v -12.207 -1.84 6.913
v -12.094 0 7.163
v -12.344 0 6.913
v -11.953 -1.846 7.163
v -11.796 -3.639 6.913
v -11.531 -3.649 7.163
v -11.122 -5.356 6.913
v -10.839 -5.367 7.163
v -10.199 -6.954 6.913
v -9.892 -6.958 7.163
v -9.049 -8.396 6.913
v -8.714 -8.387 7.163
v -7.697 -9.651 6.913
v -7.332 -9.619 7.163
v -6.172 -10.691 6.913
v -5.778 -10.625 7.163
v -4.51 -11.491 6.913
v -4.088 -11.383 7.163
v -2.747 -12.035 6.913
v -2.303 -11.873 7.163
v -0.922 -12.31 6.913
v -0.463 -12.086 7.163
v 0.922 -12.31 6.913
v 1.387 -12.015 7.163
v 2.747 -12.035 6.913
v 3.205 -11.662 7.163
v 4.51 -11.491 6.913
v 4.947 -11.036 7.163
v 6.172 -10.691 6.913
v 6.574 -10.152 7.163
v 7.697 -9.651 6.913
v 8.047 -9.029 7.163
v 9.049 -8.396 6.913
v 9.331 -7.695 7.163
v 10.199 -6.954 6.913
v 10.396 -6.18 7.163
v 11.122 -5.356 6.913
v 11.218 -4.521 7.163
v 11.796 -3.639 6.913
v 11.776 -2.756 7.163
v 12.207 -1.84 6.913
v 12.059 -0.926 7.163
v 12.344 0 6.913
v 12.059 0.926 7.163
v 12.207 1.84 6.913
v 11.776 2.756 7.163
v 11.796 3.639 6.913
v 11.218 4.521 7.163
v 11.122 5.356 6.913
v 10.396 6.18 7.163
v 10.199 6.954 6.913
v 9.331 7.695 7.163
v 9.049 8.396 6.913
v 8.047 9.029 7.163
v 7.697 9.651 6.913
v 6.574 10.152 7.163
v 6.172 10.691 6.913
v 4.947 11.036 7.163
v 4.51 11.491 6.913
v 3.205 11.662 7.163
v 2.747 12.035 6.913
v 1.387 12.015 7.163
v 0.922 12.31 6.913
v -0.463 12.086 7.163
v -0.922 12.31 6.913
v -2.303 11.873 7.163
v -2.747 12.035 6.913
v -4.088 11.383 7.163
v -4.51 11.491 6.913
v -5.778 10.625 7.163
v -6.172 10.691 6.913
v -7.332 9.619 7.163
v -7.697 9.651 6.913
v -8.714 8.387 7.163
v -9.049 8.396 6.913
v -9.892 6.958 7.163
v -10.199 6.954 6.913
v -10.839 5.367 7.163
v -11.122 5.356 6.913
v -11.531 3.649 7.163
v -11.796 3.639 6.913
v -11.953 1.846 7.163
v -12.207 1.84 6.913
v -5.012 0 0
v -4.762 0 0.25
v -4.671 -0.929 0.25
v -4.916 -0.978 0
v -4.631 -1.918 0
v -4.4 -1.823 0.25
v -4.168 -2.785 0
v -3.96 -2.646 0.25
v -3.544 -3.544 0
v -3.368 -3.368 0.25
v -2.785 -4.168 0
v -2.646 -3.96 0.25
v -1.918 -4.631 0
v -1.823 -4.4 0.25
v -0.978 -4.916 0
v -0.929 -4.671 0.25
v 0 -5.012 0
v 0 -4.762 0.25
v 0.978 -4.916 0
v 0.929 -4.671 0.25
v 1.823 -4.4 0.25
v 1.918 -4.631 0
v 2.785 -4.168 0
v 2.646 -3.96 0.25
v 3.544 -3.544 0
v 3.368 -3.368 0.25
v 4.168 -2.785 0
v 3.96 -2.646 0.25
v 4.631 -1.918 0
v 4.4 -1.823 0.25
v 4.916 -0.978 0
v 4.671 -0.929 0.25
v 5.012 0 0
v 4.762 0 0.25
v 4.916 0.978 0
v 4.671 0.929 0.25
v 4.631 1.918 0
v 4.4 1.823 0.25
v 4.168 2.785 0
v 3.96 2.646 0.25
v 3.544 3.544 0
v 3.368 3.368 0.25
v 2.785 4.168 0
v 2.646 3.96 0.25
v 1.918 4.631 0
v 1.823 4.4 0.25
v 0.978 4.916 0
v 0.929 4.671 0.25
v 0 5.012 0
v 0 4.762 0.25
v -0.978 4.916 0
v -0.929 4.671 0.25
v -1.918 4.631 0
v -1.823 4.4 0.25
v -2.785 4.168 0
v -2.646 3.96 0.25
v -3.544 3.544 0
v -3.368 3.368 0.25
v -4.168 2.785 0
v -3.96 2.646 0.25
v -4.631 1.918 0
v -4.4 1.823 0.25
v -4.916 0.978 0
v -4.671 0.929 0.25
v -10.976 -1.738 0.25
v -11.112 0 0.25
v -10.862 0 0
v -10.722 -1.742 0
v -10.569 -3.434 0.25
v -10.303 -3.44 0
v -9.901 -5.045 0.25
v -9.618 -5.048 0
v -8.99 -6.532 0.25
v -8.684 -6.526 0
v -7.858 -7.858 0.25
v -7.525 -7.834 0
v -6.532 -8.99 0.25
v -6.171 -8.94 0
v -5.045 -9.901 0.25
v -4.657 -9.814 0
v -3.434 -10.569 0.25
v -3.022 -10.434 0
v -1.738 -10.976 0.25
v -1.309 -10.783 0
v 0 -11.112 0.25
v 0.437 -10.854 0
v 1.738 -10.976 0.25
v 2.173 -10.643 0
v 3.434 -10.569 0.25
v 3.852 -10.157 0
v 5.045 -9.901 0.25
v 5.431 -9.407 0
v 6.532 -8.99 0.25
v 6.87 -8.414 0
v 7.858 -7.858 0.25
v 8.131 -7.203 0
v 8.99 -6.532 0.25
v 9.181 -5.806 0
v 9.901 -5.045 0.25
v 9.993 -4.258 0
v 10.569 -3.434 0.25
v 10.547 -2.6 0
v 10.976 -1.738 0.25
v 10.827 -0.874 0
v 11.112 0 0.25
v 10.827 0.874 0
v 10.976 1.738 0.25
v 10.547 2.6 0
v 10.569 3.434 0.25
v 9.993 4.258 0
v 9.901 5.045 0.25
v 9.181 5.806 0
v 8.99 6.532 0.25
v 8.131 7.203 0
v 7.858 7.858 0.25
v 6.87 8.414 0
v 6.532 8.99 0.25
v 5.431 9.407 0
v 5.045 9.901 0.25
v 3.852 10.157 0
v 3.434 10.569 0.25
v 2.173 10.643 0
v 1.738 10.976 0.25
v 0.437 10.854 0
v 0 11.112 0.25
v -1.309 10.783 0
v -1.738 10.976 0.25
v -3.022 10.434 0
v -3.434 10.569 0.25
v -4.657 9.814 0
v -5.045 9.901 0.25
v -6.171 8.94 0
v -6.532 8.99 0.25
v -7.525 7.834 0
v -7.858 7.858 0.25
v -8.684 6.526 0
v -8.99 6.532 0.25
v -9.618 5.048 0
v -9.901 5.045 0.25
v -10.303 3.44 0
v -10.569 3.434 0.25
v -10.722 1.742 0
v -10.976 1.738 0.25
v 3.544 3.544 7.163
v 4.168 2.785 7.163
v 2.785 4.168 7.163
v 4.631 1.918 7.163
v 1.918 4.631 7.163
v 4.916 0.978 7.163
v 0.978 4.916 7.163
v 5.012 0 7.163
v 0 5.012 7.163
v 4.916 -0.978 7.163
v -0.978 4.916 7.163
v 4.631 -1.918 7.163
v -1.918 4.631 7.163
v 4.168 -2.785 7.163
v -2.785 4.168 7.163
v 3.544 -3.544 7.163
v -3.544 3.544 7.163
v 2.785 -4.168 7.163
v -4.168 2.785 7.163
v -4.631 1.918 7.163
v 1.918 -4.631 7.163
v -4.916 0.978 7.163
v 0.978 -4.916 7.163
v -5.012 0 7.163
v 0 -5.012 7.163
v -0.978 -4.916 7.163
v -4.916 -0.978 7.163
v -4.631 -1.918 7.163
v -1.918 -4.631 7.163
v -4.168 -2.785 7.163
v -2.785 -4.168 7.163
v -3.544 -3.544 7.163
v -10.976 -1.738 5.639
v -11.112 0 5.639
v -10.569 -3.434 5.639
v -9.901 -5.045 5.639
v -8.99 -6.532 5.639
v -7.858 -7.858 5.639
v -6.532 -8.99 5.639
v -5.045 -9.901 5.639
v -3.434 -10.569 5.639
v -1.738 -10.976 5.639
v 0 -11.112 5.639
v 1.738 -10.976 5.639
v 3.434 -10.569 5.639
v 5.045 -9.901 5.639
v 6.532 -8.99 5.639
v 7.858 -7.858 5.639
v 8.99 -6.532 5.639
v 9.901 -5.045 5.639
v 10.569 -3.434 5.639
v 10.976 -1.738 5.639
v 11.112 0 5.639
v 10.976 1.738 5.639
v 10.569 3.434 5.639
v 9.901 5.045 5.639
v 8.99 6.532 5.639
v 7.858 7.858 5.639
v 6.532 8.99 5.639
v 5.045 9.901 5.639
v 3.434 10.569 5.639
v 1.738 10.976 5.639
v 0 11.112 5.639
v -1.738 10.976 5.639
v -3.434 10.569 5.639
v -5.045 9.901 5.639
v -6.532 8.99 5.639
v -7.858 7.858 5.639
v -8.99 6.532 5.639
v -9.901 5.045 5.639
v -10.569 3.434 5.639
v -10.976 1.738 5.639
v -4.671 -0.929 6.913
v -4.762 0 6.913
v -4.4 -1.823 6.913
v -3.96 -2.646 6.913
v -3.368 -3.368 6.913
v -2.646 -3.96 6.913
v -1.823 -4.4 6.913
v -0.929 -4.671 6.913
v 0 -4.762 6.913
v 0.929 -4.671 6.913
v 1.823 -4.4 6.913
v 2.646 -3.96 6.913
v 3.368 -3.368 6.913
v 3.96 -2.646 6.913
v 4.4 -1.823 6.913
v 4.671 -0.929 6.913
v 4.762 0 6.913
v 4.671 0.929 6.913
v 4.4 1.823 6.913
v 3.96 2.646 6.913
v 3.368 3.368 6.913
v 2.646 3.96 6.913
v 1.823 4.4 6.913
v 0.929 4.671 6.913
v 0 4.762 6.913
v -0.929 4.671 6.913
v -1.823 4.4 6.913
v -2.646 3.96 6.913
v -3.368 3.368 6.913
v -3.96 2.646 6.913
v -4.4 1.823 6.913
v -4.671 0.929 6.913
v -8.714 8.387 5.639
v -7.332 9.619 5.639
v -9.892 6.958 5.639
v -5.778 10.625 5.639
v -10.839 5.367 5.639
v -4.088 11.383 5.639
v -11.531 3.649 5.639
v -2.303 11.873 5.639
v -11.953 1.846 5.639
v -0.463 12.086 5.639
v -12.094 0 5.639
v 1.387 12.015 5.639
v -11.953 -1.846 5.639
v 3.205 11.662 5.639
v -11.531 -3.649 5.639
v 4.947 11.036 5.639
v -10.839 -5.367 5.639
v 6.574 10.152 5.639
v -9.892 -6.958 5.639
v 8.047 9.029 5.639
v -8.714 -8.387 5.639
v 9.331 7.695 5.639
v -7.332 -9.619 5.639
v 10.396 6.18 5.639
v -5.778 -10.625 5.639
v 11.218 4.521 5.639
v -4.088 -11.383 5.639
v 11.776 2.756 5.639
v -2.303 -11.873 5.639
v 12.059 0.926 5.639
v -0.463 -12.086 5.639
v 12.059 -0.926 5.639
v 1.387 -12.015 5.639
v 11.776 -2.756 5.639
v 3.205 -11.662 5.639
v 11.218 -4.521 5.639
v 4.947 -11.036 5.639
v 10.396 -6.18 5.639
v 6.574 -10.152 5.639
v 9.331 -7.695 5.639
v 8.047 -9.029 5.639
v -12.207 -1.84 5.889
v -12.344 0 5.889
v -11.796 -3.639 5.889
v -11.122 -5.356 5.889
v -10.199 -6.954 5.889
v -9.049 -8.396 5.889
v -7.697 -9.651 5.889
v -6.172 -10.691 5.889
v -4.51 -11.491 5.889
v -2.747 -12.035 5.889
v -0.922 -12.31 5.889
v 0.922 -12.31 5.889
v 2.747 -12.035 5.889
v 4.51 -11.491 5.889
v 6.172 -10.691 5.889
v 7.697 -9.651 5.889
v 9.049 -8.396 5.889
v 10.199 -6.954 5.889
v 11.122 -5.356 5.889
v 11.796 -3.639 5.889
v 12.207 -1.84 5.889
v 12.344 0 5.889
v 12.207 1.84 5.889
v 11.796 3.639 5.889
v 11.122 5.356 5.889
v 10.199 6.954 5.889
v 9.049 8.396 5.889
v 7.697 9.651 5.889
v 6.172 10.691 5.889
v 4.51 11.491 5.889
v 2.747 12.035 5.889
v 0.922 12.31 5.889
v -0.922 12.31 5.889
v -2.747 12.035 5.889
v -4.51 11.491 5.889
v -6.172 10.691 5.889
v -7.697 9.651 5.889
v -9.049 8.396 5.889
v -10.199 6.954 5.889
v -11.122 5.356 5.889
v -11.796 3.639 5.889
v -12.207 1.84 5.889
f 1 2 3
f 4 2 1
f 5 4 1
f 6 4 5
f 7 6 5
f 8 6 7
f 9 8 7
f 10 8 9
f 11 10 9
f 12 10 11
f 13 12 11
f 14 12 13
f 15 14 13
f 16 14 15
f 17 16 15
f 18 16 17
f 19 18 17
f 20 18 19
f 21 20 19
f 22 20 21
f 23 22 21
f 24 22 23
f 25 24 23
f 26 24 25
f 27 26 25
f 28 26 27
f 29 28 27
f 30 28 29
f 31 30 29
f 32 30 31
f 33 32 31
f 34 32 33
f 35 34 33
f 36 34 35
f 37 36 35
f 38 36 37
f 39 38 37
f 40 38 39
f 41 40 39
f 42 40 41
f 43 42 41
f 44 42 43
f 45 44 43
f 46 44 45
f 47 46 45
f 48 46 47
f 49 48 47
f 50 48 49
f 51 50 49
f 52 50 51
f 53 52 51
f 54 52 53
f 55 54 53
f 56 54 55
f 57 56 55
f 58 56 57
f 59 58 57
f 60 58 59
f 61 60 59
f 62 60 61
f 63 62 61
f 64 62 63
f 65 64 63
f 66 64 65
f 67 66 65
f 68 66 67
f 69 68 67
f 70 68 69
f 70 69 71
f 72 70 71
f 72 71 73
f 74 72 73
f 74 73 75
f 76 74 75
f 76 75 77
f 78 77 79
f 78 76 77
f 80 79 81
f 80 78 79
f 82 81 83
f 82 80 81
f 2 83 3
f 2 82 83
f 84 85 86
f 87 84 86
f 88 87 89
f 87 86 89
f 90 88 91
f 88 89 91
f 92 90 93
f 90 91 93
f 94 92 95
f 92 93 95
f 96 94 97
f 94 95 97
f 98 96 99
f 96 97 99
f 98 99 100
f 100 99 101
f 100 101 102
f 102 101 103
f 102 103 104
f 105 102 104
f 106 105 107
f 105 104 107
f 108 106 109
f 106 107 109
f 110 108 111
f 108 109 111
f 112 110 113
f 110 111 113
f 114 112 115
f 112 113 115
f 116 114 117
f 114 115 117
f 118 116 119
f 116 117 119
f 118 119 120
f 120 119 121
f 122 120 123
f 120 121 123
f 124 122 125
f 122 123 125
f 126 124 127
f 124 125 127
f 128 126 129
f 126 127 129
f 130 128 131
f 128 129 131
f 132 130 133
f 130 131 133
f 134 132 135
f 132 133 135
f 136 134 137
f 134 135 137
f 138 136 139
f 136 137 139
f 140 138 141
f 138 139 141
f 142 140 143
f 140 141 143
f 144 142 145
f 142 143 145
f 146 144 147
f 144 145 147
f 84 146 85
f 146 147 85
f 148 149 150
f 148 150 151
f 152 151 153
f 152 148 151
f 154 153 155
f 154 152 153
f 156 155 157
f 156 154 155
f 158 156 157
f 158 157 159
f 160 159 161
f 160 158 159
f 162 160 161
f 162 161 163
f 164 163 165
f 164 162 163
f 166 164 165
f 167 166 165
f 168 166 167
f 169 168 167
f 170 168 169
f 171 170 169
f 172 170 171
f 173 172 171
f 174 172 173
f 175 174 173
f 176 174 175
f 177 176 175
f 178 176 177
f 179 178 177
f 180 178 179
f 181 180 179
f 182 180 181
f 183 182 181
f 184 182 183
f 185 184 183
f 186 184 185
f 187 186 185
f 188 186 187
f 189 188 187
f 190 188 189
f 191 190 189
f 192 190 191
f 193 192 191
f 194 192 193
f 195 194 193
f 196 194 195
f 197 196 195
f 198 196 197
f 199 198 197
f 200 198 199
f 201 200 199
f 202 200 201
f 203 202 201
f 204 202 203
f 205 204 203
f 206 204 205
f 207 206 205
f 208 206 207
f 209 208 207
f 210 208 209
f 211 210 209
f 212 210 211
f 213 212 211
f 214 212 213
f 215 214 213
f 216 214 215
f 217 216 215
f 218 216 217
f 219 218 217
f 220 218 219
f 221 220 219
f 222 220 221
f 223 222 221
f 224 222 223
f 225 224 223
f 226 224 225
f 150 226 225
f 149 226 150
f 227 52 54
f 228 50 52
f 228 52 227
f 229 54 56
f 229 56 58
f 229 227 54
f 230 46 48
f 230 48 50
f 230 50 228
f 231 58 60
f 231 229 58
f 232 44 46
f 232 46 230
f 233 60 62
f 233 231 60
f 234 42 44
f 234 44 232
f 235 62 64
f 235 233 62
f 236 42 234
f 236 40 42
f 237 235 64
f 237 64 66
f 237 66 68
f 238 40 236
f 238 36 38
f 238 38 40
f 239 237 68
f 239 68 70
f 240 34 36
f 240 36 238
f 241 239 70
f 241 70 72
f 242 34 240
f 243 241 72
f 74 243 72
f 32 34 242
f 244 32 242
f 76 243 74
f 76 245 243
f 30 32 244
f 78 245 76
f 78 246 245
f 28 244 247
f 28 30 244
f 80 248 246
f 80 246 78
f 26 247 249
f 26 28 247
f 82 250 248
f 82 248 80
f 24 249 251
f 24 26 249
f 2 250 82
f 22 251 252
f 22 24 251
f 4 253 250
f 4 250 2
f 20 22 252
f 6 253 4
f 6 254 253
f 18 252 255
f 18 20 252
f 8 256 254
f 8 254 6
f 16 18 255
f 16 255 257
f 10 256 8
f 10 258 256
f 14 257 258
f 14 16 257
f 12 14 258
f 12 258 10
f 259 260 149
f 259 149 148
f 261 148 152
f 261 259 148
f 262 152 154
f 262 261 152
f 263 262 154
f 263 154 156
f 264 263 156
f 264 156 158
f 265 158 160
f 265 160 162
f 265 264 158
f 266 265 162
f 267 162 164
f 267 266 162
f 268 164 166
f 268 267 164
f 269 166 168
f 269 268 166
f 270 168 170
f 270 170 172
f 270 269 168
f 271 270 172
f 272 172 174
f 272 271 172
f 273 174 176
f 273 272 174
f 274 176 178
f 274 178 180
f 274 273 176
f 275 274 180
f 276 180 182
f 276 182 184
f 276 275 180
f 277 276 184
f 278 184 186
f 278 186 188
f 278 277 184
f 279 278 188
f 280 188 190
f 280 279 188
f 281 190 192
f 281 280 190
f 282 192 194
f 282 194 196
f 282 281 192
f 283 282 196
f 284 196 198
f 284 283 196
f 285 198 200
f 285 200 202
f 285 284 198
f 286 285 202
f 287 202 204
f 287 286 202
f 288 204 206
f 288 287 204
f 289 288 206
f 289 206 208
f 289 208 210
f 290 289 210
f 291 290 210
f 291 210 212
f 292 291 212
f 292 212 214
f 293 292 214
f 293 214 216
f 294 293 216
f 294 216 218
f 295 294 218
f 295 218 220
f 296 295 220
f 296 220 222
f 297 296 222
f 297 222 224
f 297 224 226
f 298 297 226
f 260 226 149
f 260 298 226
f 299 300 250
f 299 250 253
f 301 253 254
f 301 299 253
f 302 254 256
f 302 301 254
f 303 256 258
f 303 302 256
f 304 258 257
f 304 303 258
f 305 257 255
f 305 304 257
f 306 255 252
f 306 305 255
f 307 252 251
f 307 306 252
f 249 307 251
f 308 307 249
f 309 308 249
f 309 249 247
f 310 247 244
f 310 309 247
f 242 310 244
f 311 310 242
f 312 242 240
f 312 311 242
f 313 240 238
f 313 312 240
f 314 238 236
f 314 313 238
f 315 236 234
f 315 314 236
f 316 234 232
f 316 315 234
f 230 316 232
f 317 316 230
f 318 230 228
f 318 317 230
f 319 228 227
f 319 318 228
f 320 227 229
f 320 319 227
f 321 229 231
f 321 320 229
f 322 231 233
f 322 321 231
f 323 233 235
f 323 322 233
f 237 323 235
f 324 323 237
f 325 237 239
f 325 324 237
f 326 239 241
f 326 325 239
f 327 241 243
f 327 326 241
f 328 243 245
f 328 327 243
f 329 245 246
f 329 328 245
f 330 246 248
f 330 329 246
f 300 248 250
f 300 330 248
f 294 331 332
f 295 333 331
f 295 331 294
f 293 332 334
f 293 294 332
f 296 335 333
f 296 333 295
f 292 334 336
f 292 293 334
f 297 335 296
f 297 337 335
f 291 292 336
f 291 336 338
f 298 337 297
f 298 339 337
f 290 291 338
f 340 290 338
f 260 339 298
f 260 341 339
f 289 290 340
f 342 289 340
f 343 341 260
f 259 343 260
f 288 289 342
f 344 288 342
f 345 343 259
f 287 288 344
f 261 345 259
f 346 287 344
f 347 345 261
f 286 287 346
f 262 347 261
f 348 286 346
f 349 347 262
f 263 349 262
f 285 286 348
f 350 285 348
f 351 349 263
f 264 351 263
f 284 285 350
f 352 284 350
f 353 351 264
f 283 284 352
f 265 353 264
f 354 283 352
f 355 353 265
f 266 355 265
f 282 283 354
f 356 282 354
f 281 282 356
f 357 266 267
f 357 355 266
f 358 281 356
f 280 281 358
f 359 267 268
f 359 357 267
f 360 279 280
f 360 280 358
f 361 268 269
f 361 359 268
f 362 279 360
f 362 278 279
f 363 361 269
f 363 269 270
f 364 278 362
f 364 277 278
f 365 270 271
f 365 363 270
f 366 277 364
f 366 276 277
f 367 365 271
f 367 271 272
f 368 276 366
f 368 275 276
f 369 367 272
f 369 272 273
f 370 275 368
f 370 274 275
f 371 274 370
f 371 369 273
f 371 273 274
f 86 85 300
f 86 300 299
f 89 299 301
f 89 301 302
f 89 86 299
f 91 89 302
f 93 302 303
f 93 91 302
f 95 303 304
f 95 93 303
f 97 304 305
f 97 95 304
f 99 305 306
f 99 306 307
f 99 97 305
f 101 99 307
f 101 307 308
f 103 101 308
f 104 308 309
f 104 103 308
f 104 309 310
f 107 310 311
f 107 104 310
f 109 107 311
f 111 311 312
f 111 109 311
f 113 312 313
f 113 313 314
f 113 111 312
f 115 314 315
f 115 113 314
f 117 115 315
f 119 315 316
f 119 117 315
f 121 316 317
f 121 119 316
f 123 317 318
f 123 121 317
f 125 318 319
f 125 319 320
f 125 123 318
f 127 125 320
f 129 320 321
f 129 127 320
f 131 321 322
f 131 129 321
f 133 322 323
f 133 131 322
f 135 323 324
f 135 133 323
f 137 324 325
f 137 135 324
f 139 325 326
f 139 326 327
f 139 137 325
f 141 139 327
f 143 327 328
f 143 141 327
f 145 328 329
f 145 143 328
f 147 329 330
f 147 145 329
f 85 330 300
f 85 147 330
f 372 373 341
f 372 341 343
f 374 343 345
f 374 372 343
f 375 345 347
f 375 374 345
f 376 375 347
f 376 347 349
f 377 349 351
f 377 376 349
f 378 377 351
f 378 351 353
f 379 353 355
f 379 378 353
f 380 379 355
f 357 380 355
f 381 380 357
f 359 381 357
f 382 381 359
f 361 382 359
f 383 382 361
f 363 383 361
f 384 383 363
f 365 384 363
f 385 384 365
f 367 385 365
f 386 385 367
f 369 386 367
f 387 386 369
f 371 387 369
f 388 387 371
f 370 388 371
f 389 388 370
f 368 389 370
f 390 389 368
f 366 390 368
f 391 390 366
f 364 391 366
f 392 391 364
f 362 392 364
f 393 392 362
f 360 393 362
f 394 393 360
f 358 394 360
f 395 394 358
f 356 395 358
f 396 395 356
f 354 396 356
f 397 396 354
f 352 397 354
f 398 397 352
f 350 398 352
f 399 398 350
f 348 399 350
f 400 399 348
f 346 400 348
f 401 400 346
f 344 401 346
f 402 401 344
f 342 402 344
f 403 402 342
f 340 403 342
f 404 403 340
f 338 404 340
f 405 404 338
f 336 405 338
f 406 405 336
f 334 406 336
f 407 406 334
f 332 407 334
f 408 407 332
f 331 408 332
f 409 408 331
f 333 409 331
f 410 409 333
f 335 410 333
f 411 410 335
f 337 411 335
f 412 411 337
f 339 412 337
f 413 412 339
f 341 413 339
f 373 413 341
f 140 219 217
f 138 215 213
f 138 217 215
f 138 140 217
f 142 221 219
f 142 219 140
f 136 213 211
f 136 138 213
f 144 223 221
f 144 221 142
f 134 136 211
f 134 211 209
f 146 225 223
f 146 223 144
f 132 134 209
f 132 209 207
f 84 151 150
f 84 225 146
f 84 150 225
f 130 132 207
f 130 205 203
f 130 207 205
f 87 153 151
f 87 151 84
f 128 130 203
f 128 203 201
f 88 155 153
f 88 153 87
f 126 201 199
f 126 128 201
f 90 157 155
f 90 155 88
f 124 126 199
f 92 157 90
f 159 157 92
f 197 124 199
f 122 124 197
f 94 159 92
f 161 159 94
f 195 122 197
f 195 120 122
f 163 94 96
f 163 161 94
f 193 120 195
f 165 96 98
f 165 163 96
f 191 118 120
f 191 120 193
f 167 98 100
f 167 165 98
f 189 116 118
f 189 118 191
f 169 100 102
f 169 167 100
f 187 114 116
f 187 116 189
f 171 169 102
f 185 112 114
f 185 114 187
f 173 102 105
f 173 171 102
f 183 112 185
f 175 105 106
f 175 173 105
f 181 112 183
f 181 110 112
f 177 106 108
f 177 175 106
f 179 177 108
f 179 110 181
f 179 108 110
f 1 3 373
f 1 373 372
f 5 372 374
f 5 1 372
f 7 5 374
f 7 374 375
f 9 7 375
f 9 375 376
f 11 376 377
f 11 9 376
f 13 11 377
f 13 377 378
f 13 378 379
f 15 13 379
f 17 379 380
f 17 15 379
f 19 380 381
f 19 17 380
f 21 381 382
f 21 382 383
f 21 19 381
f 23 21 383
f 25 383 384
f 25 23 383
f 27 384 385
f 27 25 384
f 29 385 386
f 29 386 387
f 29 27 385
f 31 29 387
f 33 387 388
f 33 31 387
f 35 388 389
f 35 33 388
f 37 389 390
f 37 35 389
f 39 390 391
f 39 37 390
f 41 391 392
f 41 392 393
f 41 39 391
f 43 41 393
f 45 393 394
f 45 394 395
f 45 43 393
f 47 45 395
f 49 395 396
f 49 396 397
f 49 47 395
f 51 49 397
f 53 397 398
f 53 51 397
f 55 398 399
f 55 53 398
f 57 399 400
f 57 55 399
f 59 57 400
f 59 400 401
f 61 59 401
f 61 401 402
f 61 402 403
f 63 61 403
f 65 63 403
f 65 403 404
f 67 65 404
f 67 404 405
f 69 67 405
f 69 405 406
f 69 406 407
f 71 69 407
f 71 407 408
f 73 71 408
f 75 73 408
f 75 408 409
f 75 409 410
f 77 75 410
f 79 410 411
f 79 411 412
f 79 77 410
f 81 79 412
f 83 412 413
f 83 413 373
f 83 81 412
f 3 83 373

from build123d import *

# Parameters (mm, degrees)
CHAMFER1_SIZE = 0.25


with BuildPart() as part:
    # Sketch2 → Revolve1 (revolve)
    with BuildSketch(Plane(origin=(0, 0, 0), x_dir=(1, 0, 0), z_dir=(0, 1, 0))):
        Polygon((-4.762498993, -2.9131e-05), (-11.112498283, -2.9131e-05), (-11.112498283, -5.638830007), (-12.344399539, -5.638830007), (-12.344399539, -7.162829152), (-4.762498993, -7.162829152), align=None)
    revolve(axis=Axis((0, 0, 0), (0, 0, 1)))

    # Chamfer1
    chamfer1_edges = [part.edges().sort_by_distance(p)[0] for p in [
        (11.112498283, 0, 2.9131e-05),
        (4.762498993, 0, 2.9131e-05),
        (4.762498993, 0, 7.162829152),
        (12.344399539, 0, 7.162829152),
        (12.344399539, 0, 5.638830007),
    ]]
    chamfer(chamfer1_edges, length=CHAMFER1_SIZE)


solid = part.part
